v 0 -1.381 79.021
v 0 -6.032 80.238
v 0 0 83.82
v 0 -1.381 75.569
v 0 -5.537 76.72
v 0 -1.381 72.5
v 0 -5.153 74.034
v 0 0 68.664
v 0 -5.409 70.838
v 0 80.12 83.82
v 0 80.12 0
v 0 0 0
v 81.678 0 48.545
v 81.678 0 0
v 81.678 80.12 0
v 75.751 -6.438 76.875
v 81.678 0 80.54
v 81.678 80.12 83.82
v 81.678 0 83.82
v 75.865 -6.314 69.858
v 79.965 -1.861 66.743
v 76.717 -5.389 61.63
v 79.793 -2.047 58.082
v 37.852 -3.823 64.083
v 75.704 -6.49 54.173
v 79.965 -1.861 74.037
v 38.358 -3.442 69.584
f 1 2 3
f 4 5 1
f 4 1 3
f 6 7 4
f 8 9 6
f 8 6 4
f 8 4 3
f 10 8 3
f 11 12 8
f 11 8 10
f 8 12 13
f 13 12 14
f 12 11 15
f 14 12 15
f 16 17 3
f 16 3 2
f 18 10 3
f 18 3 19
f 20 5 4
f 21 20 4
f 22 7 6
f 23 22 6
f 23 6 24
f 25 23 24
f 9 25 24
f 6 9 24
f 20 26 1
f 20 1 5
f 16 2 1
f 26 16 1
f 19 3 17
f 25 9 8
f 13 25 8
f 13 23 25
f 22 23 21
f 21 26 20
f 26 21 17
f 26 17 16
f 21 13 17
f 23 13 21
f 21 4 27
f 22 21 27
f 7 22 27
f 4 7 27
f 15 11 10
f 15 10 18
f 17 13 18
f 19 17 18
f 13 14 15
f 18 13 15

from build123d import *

# Parameters (mm, degrees)
F0_W     = 81.678458
F0_H     = 80.120139
F1_DEPTH = 83.81969
F6_DEPTH = 83.82069


with BuildPart() as f1:
    # F0 (on Top) → F1 (new body)
    with BuildSketch(Plane.XY):
        with Locations((40.839229, 40.060069)):
            Rectangle(F0_W, F0_H)
    extrude(amount=F1_DEPTH)

    # F2 (on face) → F4 section 0
    with BuildSketch(Plane.YZ.offset(81.678458)):
        Polygon((0, 48.545107), (0, 80.539919), (-6.469702, 76.612413), (-1.871645, 73.930211), (-6.37391, 69.332153), (-1.871645, 66.554159), (-5.404703, 60.828167), (-2.06323, 57.741221), (-6.575088, 52.857349), align=None)
    # F3 (on face) → F4 section 1
    with BuildSketch(Plane(origin=(0, 0, 0), x_dir=(0, -1, 0), z_dir=(-1, 0, 0))):
        Polygon((6.032056, 80.237612), (0, 83.81969), (0, 68.663813), (5.409211, 70.837572), (1.381365, 72.499856), (5.153475, 74.034274), (1.381365, 75.568691), (5.53708, 76.7195), (1.381365, 79.021126), align=None)
    loft()

    # F5 (on face) → F6 (cut, through all)
    with BuildSketch(Plane.XY.offset(83.81969)):
        Polygon((83.874113, -8.362563), (81.678458, 0), (73.979422, -8.362563), align=None)
    extrude(amount=-F6_DEPTH, mode=Mode.SUBTRACT)


solid = f1.part
